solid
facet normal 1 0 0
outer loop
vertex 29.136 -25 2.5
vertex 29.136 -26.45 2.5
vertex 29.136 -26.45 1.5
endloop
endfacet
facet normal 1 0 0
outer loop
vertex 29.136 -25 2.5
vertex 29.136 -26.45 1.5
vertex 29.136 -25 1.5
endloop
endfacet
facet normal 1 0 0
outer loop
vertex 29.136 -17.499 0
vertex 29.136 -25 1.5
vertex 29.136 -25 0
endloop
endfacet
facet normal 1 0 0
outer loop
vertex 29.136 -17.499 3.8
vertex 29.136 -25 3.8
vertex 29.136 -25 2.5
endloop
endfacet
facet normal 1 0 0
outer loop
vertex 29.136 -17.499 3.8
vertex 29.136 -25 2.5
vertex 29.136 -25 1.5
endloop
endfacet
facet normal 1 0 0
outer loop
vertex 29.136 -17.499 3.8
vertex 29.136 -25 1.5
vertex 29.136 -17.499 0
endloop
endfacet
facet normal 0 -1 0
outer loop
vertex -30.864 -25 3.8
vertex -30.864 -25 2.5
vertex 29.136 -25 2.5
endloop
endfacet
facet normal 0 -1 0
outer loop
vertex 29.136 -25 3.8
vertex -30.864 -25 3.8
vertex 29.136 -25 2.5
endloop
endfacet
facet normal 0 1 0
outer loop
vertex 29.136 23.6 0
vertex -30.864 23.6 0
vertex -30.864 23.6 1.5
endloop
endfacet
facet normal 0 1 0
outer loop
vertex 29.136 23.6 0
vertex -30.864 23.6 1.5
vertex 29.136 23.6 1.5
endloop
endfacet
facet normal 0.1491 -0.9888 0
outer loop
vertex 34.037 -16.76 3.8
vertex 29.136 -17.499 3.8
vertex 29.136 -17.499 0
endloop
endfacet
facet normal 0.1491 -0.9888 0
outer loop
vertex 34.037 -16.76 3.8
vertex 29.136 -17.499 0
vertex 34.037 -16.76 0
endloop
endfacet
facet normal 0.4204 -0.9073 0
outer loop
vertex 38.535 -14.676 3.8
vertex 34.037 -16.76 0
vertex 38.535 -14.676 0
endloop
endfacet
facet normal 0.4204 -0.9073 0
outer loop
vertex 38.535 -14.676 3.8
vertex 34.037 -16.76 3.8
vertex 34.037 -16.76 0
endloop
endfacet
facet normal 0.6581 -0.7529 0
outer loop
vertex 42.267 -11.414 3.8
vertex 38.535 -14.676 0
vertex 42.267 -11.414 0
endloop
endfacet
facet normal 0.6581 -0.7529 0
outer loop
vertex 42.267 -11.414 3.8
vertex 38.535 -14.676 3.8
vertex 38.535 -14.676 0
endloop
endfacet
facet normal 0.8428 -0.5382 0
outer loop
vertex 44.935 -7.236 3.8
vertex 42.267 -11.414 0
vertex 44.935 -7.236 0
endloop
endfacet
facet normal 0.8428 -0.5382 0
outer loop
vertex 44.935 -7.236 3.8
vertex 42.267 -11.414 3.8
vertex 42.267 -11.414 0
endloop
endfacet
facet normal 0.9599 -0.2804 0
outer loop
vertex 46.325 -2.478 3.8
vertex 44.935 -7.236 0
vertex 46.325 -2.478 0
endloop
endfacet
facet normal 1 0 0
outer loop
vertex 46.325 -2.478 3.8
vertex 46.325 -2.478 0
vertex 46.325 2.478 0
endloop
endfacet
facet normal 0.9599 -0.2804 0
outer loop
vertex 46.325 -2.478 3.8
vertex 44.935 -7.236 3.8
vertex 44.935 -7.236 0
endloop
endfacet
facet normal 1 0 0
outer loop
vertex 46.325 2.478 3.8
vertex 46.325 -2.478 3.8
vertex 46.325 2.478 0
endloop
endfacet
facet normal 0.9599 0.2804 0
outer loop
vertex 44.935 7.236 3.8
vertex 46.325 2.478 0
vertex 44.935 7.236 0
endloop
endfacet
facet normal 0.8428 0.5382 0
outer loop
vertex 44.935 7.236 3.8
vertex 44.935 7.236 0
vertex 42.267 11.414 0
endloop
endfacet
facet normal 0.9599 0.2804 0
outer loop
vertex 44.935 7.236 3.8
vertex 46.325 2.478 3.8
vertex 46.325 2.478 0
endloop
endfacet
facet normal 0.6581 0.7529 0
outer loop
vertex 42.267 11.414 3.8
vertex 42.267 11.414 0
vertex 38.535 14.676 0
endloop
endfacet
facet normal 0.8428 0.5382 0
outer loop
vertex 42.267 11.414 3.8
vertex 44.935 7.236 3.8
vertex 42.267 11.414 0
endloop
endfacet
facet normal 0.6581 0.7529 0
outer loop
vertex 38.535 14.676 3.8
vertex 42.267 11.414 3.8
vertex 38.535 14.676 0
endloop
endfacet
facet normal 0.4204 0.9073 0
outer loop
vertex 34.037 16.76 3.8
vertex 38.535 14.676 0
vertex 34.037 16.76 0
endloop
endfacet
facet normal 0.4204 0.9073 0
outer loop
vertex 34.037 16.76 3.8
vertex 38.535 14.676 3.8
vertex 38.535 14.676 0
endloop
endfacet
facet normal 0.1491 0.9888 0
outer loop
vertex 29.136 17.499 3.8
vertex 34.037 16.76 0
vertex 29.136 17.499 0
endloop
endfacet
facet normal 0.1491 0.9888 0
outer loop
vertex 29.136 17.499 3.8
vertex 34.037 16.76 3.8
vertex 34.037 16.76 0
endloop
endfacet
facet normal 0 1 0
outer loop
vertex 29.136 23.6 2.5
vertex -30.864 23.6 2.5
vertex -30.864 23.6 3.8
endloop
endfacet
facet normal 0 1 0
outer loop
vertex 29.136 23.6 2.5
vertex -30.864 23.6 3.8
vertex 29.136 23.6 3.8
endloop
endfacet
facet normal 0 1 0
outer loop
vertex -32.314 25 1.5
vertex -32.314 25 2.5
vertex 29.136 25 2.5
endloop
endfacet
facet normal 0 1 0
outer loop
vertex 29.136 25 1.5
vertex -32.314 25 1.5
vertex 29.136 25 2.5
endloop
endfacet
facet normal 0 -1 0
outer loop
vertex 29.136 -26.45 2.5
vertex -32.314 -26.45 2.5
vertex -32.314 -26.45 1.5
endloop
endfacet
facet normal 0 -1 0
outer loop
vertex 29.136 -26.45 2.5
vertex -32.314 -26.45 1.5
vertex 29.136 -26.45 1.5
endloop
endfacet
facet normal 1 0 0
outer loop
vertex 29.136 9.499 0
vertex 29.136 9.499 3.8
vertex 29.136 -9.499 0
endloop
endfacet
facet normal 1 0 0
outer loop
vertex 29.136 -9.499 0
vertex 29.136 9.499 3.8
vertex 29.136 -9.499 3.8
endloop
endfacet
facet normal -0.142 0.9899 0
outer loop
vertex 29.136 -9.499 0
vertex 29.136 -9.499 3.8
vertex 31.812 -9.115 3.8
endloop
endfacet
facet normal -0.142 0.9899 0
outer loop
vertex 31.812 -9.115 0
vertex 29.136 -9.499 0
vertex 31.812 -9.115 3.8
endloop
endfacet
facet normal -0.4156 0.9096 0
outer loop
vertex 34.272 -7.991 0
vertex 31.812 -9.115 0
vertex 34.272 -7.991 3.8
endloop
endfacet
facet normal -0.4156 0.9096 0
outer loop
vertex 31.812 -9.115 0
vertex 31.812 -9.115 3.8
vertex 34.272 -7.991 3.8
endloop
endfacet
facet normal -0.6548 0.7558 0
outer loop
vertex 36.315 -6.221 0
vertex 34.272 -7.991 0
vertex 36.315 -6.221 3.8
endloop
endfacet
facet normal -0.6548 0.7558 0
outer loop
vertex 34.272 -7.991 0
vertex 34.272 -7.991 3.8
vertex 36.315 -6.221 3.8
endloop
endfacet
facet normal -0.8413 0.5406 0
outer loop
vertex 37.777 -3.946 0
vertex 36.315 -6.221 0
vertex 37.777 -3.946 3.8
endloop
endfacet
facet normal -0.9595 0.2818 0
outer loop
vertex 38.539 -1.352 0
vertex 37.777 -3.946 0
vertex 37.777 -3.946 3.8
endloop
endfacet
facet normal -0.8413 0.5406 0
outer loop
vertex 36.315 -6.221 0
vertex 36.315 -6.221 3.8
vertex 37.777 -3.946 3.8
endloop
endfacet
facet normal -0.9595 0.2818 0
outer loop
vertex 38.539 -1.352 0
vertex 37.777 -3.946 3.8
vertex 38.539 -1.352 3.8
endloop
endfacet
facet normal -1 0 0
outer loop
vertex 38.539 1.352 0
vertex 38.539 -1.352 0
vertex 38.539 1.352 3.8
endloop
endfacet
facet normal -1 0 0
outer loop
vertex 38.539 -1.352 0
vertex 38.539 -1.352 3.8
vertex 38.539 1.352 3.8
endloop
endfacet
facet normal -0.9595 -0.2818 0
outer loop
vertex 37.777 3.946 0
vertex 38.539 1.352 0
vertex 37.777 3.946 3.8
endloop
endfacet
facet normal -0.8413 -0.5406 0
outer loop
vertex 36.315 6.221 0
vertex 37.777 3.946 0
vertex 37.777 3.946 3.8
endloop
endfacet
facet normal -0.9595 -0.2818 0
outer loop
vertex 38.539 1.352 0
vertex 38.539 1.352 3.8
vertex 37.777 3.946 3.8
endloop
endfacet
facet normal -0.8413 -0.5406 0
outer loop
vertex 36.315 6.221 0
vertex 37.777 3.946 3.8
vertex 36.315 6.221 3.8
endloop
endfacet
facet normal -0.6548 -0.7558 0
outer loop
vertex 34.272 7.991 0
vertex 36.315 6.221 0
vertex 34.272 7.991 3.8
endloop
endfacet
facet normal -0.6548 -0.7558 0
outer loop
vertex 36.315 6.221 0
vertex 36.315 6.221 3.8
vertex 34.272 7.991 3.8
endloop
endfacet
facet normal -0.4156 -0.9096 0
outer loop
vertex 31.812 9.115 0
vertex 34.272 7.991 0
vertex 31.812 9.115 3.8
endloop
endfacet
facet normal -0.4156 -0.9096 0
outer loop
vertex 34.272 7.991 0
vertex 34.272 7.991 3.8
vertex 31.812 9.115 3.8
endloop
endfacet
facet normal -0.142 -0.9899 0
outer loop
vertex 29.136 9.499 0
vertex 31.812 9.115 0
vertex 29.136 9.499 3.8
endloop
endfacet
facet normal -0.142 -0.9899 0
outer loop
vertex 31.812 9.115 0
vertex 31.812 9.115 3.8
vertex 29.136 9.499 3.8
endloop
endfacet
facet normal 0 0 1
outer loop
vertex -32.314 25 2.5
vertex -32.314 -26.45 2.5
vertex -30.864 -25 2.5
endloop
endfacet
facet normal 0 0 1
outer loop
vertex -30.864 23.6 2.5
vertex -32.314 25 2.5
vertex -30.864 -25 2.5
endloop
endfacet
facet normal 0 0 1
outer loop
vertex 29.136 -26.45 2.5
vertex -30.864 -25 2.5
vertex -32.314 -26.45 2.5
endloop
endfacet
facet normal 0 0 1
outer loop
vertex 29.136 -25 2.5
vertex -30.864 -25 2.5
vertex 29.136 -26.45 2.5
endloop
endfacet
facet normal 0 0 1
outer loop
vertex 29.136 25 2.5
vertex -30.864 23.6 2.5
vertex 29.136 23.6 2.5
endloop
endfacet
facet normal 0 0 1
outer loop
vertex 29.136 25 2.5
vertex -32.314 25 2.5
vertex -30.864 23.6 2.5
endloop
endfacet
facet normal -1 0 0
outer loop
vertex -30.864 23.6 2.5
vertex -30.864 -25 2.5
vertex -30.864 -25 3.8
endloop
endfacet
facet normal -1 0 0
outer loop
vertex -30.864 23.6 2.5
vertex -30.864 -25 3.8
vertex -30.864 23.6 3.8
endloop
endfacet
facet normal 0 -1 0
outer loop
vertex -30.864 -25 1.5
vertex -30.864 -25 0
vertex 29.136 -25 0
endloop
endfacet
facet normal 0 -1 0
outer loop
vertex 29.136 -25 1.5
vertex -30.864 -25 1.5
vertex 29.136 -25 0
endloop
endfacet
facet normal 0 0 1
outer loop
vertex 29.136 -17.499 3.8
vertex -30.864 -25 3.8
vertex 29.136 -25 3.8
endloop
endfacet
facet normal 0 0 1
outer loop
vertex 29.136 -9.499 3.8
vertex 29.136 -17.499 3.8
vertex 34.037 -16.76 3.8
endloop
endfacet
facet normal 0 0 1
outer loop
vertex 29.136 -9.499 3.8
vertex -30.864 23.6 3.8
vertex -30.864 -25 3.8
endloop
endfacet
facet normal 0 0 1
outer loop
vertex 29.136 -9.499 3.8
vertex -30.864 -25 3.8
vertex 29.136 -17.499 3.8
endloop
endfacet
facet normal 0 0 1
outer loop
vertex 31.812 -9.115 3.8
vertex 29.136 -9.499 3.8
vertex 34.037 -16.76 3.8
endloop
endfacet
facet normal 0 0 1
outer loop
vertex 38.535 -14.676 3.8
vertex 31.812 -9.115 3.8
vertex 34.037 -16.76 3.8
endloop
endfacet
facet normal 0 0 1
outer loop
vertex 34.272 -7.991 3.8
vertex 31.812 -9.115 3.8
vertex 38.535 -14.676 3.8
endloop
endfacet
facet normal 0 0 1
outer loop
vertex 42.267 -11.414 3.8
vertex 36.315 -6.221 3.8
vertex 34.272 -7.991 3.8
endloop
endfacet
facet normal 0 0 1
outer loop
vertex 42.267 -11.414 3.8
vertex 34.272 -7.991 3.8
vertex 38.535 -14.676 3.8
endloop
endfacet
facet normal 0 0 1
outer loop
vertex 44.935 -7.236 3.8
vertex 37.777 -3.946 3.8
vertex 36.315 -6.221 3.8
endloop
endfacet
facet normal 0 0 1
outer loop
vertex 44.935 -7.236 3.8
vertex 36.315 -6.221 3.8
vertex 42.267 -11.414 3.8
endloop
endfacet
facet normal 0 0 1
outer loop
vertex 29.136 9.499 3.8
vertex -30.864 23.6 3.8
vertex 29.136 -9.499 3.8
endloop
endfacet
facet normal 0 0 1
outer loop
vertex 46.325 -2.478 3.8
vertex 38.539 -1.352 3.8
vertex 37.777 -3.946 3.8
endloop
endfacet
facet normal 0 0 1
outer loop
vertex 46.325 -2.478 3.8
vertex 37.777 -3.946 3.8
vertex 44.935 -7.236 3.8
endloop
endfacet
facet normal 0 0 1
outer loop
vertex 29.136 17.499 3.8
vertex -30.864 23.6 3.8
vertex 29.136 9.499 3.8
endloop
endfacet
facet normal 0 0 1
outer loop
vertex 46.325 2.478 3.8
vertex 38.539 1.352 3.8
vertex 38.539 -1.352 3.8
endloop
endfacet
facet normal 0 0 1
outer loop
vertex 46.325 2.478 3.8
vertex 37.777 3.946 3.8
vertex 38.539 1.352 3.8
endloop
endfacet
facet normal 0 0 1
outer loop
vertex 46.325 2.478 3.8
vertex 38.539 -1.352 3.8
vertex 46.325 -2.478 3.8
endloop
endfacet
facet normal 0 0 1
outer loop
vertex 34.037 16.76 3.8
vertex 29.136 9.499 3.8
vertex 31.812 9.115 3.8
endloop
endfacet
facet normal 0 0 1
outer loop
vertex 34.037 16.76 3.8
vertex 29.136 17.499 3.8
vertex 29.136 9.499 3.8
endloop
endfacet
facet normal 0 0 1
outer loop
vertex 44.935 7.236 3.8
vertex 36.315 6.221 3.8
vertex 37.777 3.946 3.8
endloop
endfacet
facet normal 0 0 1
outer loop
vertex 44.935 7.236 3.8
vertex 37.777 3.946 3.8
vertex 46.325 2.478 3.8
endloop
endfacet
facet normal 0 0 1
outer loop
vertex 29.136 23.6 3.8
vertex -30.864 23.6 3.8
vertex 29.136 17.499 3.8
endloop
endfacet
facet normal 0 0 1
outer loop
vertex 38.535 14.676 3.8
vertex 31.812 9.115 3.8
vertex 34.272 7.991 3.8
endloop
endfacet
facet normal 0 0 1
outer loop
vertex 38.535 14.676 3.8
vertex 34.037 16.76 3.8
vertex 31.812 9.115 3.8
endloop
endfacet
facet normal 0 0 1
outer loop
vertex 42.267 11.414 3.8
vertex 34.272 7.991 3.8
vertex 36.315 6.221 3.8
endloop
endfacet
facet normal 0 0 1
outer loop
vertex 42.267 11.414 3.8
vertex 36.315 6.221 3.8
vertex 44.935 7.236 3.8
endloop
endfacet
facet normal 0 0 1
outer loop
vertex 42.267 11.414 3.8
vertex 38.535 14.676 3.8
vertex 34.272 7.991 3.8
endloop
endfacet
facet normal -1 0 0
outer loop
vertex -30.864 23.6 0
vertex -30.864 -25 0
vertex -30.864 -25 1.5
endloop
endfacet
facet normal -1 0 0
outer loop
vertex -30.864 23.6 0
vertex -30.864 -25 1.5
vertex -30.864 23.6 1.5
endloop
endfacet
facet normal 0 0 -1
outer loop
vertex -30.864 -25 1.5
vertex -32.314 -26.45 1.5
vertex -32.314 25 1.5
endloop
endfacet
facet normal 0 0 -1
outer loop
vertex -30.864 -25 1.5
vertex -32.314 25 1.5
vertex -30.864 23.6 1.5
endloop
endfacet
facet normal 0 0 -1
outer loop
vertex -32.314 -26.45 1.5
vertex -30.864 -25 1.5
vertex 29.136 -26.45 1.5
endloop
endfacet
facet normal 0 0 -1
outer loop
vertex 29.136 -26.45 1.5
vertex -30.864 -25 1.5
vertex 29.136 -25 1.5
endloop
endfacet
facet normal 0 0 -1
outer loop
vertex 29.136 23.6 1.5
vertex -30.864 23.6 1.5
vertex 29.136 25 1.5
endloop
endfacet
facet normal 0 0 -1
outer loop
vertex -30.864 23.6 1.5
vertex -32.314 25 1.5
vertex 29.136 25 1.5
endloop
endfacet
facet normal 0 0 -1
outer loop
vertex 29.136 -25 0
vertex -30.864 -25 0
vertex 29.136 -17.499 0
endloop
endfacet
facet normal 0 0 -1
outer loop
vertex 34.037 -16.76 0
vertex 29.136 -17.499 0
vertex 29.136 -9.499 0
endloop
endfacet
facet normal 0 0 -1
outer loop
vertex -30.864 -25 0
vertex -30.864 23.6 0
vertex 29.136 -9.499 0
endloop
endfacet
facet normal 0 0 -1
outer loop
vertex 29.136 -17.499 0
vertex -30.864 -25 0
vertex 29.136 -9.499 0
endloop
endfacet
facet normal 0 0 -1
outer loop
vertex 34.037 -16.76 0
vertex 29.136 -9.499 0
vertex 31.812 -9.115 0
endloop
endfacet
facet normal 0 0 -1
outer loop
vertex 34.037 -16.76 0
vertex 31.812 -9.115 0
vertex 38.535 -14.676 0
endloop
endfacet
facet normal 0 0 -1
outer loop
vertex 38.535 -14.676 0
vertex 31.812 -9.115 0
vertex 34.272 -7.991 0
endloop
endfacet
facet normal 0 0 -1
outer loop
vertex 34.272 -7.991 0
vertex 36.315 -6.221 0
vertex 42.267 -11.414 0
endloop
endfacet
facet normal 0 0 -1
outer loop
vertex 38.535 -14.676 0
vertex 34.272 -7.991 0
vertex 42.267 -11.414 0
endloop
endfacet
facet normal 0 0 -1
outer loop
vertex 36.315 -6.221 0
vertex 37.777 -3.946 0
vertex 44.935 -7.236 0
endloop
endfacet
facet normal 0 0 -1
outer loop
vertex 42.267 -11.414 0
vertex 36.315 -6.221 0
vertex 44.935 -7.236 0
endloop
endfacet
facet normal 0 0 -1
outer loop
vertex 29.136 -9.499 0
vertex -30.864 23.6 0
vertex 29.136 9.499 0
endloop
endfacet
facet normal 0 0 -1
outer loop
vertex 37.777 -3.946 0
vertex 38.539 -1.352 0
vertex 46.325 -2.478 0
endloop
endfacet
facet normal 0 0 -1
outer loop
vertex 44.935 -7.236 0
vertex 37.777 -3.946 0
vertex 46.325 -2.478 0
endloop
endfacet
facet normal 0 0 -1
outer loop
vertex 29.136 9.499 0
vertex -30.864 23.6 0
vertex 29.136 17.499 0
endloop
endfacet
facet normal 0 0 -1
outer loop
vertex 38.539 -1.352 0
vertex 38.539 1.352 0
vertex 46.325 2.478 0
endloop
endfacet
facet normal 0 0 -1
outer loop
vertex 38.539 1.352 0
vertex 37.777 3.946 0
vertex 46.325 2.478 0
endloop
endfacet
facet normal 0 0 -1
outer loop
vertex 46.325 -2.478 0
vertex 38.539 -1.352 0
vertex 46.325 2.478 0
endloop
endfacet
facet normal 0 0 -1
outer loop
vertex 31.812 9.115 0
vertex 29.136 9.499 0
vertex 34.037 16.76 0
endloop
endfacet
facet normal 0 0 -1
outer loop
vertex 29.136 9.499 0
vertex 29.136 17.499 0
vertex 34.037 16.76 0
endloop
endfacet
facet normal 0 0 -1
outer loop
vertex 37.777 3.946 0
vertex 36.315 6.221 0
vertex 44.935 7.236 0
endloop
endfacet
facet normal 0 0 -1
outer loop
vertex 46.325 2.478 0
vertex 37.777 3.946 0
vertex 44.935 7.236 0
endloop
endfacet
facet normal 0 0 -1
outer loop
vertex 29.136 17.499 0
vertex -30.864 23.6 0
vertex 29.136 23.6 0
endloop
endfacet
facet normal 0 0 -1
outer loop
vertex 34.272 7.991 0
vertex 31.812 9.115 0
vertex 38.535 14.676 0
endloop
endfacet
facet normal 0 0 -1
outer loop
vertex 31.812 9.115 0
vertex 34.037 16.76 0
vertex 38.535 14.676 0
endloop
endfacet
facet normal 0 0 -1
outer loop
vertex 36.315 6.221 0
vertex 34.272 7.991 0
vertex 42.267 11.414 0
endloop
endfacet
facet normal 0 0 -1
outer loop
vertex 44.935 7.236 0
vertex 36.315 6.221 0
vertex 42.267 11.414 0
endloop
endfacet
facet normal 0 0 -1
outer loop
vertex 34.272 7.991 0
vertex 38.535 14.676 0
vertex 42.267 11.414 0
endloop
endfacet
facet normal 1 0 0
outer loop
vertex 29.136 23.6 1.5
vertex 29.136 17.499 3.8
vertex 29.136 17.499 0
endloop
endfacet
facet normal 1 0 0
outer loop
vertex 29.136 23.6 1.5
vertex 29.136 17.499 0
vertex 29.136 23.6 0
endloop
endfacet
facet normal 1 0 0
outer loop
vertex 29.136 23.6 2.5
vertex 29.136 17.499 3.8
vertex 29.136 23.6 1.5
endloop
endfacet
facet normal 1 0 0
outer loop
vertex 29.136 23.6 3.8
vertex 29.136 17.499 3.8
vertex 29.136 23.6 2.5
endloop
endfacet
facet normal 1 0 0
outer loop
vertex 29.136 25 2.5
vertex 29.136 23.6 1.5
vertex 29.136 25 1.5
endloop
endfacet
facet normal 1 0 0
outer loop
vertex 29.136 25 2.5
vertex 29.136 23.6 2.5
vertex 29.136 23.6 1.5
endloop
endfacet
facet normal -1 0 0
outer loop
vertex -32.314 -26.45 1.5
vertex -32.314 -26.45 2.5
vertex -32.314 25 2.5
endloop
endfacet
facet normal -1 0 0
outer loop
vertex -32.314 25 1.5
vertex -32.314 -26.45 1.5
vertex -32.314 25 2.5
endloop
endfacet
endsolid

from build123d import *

# Parameters (mm, degrees)
SKETCH1_W           = 60
SKETCH1_H           = 48.6
BOSS_EXTRUDE1_DEPTH = 3.8
SKETCH3_R           = 17.5
BOSS_EXTRUDE3_DEPTH = 3.8
CUT_EXTRUDE2_REACH  = 5.8
BOSS_EXTRUDE4_START = -1.3
SKETCH2_W           = 61.45
SKETCH2_H           = 51.45
BOSS_EXTRUDE4_DEPTH = 1


with BuildPart() as part:
    # Sketch1 → Boss-Extrude1 (new body)
    with BuildSketch(Plane.XY):
        with Locations((-0.864197531, -0.7)):
            Rectangle(SKETCH1_W, SKETCH1_H)
    extrude(amount=BOSS_EXTRUDE1_DEPTH)

    # Sketch3 → Boss-Extrude3 (add)
    with BuildSketch(Plane.XY.offset(3.8)):
        with Locations((29.001697978, 0)):
            Circle(SKETCH3_R)
    extrude(amount=-BOSS_EXTRUDE3_DEPTH)

    # Sketch4 → Cut-Extrude2 (cut, up to next)
    with BuildSketch(Plane.XY.offset(3.8), mode=Mode.PRIVATE) as cut_extrude2_sk1:
        with BuildLine():
            Line((29.135802469, 9.499486163), (29.135802469, -9.499486163))
            ThreePointArc((29.135802469, -9.499486163), (38.635288633, 0), (29.135802469, 9.499486163))
        make_face()
    cut_extrude2_tool1 = extrude(cut_extrude2_sk1.sketch, amount=-CUT_EXTRUDE2_REACH, mode=Mode.PRIVATE) & part.part
    add(cut_extrude2_tool1.solids().sort_by_distance((33.16751, 0, 3.8))[0], mode=Mode.SUBTRACT)

    # Sketch2 → Boss-Extrude4 (add)
    with BuildSketch(Plane.XY.offset(3.8).offset(BOSS_EXTRUDE4_START)):
        with Locations((-1.589197531, -0.725)):
            Rectangle(SKETCH2_W, SKETCH2_H)
    extrude(amount=-BOSS_EXTRUDE4_DEPTH)


solid = part.part
